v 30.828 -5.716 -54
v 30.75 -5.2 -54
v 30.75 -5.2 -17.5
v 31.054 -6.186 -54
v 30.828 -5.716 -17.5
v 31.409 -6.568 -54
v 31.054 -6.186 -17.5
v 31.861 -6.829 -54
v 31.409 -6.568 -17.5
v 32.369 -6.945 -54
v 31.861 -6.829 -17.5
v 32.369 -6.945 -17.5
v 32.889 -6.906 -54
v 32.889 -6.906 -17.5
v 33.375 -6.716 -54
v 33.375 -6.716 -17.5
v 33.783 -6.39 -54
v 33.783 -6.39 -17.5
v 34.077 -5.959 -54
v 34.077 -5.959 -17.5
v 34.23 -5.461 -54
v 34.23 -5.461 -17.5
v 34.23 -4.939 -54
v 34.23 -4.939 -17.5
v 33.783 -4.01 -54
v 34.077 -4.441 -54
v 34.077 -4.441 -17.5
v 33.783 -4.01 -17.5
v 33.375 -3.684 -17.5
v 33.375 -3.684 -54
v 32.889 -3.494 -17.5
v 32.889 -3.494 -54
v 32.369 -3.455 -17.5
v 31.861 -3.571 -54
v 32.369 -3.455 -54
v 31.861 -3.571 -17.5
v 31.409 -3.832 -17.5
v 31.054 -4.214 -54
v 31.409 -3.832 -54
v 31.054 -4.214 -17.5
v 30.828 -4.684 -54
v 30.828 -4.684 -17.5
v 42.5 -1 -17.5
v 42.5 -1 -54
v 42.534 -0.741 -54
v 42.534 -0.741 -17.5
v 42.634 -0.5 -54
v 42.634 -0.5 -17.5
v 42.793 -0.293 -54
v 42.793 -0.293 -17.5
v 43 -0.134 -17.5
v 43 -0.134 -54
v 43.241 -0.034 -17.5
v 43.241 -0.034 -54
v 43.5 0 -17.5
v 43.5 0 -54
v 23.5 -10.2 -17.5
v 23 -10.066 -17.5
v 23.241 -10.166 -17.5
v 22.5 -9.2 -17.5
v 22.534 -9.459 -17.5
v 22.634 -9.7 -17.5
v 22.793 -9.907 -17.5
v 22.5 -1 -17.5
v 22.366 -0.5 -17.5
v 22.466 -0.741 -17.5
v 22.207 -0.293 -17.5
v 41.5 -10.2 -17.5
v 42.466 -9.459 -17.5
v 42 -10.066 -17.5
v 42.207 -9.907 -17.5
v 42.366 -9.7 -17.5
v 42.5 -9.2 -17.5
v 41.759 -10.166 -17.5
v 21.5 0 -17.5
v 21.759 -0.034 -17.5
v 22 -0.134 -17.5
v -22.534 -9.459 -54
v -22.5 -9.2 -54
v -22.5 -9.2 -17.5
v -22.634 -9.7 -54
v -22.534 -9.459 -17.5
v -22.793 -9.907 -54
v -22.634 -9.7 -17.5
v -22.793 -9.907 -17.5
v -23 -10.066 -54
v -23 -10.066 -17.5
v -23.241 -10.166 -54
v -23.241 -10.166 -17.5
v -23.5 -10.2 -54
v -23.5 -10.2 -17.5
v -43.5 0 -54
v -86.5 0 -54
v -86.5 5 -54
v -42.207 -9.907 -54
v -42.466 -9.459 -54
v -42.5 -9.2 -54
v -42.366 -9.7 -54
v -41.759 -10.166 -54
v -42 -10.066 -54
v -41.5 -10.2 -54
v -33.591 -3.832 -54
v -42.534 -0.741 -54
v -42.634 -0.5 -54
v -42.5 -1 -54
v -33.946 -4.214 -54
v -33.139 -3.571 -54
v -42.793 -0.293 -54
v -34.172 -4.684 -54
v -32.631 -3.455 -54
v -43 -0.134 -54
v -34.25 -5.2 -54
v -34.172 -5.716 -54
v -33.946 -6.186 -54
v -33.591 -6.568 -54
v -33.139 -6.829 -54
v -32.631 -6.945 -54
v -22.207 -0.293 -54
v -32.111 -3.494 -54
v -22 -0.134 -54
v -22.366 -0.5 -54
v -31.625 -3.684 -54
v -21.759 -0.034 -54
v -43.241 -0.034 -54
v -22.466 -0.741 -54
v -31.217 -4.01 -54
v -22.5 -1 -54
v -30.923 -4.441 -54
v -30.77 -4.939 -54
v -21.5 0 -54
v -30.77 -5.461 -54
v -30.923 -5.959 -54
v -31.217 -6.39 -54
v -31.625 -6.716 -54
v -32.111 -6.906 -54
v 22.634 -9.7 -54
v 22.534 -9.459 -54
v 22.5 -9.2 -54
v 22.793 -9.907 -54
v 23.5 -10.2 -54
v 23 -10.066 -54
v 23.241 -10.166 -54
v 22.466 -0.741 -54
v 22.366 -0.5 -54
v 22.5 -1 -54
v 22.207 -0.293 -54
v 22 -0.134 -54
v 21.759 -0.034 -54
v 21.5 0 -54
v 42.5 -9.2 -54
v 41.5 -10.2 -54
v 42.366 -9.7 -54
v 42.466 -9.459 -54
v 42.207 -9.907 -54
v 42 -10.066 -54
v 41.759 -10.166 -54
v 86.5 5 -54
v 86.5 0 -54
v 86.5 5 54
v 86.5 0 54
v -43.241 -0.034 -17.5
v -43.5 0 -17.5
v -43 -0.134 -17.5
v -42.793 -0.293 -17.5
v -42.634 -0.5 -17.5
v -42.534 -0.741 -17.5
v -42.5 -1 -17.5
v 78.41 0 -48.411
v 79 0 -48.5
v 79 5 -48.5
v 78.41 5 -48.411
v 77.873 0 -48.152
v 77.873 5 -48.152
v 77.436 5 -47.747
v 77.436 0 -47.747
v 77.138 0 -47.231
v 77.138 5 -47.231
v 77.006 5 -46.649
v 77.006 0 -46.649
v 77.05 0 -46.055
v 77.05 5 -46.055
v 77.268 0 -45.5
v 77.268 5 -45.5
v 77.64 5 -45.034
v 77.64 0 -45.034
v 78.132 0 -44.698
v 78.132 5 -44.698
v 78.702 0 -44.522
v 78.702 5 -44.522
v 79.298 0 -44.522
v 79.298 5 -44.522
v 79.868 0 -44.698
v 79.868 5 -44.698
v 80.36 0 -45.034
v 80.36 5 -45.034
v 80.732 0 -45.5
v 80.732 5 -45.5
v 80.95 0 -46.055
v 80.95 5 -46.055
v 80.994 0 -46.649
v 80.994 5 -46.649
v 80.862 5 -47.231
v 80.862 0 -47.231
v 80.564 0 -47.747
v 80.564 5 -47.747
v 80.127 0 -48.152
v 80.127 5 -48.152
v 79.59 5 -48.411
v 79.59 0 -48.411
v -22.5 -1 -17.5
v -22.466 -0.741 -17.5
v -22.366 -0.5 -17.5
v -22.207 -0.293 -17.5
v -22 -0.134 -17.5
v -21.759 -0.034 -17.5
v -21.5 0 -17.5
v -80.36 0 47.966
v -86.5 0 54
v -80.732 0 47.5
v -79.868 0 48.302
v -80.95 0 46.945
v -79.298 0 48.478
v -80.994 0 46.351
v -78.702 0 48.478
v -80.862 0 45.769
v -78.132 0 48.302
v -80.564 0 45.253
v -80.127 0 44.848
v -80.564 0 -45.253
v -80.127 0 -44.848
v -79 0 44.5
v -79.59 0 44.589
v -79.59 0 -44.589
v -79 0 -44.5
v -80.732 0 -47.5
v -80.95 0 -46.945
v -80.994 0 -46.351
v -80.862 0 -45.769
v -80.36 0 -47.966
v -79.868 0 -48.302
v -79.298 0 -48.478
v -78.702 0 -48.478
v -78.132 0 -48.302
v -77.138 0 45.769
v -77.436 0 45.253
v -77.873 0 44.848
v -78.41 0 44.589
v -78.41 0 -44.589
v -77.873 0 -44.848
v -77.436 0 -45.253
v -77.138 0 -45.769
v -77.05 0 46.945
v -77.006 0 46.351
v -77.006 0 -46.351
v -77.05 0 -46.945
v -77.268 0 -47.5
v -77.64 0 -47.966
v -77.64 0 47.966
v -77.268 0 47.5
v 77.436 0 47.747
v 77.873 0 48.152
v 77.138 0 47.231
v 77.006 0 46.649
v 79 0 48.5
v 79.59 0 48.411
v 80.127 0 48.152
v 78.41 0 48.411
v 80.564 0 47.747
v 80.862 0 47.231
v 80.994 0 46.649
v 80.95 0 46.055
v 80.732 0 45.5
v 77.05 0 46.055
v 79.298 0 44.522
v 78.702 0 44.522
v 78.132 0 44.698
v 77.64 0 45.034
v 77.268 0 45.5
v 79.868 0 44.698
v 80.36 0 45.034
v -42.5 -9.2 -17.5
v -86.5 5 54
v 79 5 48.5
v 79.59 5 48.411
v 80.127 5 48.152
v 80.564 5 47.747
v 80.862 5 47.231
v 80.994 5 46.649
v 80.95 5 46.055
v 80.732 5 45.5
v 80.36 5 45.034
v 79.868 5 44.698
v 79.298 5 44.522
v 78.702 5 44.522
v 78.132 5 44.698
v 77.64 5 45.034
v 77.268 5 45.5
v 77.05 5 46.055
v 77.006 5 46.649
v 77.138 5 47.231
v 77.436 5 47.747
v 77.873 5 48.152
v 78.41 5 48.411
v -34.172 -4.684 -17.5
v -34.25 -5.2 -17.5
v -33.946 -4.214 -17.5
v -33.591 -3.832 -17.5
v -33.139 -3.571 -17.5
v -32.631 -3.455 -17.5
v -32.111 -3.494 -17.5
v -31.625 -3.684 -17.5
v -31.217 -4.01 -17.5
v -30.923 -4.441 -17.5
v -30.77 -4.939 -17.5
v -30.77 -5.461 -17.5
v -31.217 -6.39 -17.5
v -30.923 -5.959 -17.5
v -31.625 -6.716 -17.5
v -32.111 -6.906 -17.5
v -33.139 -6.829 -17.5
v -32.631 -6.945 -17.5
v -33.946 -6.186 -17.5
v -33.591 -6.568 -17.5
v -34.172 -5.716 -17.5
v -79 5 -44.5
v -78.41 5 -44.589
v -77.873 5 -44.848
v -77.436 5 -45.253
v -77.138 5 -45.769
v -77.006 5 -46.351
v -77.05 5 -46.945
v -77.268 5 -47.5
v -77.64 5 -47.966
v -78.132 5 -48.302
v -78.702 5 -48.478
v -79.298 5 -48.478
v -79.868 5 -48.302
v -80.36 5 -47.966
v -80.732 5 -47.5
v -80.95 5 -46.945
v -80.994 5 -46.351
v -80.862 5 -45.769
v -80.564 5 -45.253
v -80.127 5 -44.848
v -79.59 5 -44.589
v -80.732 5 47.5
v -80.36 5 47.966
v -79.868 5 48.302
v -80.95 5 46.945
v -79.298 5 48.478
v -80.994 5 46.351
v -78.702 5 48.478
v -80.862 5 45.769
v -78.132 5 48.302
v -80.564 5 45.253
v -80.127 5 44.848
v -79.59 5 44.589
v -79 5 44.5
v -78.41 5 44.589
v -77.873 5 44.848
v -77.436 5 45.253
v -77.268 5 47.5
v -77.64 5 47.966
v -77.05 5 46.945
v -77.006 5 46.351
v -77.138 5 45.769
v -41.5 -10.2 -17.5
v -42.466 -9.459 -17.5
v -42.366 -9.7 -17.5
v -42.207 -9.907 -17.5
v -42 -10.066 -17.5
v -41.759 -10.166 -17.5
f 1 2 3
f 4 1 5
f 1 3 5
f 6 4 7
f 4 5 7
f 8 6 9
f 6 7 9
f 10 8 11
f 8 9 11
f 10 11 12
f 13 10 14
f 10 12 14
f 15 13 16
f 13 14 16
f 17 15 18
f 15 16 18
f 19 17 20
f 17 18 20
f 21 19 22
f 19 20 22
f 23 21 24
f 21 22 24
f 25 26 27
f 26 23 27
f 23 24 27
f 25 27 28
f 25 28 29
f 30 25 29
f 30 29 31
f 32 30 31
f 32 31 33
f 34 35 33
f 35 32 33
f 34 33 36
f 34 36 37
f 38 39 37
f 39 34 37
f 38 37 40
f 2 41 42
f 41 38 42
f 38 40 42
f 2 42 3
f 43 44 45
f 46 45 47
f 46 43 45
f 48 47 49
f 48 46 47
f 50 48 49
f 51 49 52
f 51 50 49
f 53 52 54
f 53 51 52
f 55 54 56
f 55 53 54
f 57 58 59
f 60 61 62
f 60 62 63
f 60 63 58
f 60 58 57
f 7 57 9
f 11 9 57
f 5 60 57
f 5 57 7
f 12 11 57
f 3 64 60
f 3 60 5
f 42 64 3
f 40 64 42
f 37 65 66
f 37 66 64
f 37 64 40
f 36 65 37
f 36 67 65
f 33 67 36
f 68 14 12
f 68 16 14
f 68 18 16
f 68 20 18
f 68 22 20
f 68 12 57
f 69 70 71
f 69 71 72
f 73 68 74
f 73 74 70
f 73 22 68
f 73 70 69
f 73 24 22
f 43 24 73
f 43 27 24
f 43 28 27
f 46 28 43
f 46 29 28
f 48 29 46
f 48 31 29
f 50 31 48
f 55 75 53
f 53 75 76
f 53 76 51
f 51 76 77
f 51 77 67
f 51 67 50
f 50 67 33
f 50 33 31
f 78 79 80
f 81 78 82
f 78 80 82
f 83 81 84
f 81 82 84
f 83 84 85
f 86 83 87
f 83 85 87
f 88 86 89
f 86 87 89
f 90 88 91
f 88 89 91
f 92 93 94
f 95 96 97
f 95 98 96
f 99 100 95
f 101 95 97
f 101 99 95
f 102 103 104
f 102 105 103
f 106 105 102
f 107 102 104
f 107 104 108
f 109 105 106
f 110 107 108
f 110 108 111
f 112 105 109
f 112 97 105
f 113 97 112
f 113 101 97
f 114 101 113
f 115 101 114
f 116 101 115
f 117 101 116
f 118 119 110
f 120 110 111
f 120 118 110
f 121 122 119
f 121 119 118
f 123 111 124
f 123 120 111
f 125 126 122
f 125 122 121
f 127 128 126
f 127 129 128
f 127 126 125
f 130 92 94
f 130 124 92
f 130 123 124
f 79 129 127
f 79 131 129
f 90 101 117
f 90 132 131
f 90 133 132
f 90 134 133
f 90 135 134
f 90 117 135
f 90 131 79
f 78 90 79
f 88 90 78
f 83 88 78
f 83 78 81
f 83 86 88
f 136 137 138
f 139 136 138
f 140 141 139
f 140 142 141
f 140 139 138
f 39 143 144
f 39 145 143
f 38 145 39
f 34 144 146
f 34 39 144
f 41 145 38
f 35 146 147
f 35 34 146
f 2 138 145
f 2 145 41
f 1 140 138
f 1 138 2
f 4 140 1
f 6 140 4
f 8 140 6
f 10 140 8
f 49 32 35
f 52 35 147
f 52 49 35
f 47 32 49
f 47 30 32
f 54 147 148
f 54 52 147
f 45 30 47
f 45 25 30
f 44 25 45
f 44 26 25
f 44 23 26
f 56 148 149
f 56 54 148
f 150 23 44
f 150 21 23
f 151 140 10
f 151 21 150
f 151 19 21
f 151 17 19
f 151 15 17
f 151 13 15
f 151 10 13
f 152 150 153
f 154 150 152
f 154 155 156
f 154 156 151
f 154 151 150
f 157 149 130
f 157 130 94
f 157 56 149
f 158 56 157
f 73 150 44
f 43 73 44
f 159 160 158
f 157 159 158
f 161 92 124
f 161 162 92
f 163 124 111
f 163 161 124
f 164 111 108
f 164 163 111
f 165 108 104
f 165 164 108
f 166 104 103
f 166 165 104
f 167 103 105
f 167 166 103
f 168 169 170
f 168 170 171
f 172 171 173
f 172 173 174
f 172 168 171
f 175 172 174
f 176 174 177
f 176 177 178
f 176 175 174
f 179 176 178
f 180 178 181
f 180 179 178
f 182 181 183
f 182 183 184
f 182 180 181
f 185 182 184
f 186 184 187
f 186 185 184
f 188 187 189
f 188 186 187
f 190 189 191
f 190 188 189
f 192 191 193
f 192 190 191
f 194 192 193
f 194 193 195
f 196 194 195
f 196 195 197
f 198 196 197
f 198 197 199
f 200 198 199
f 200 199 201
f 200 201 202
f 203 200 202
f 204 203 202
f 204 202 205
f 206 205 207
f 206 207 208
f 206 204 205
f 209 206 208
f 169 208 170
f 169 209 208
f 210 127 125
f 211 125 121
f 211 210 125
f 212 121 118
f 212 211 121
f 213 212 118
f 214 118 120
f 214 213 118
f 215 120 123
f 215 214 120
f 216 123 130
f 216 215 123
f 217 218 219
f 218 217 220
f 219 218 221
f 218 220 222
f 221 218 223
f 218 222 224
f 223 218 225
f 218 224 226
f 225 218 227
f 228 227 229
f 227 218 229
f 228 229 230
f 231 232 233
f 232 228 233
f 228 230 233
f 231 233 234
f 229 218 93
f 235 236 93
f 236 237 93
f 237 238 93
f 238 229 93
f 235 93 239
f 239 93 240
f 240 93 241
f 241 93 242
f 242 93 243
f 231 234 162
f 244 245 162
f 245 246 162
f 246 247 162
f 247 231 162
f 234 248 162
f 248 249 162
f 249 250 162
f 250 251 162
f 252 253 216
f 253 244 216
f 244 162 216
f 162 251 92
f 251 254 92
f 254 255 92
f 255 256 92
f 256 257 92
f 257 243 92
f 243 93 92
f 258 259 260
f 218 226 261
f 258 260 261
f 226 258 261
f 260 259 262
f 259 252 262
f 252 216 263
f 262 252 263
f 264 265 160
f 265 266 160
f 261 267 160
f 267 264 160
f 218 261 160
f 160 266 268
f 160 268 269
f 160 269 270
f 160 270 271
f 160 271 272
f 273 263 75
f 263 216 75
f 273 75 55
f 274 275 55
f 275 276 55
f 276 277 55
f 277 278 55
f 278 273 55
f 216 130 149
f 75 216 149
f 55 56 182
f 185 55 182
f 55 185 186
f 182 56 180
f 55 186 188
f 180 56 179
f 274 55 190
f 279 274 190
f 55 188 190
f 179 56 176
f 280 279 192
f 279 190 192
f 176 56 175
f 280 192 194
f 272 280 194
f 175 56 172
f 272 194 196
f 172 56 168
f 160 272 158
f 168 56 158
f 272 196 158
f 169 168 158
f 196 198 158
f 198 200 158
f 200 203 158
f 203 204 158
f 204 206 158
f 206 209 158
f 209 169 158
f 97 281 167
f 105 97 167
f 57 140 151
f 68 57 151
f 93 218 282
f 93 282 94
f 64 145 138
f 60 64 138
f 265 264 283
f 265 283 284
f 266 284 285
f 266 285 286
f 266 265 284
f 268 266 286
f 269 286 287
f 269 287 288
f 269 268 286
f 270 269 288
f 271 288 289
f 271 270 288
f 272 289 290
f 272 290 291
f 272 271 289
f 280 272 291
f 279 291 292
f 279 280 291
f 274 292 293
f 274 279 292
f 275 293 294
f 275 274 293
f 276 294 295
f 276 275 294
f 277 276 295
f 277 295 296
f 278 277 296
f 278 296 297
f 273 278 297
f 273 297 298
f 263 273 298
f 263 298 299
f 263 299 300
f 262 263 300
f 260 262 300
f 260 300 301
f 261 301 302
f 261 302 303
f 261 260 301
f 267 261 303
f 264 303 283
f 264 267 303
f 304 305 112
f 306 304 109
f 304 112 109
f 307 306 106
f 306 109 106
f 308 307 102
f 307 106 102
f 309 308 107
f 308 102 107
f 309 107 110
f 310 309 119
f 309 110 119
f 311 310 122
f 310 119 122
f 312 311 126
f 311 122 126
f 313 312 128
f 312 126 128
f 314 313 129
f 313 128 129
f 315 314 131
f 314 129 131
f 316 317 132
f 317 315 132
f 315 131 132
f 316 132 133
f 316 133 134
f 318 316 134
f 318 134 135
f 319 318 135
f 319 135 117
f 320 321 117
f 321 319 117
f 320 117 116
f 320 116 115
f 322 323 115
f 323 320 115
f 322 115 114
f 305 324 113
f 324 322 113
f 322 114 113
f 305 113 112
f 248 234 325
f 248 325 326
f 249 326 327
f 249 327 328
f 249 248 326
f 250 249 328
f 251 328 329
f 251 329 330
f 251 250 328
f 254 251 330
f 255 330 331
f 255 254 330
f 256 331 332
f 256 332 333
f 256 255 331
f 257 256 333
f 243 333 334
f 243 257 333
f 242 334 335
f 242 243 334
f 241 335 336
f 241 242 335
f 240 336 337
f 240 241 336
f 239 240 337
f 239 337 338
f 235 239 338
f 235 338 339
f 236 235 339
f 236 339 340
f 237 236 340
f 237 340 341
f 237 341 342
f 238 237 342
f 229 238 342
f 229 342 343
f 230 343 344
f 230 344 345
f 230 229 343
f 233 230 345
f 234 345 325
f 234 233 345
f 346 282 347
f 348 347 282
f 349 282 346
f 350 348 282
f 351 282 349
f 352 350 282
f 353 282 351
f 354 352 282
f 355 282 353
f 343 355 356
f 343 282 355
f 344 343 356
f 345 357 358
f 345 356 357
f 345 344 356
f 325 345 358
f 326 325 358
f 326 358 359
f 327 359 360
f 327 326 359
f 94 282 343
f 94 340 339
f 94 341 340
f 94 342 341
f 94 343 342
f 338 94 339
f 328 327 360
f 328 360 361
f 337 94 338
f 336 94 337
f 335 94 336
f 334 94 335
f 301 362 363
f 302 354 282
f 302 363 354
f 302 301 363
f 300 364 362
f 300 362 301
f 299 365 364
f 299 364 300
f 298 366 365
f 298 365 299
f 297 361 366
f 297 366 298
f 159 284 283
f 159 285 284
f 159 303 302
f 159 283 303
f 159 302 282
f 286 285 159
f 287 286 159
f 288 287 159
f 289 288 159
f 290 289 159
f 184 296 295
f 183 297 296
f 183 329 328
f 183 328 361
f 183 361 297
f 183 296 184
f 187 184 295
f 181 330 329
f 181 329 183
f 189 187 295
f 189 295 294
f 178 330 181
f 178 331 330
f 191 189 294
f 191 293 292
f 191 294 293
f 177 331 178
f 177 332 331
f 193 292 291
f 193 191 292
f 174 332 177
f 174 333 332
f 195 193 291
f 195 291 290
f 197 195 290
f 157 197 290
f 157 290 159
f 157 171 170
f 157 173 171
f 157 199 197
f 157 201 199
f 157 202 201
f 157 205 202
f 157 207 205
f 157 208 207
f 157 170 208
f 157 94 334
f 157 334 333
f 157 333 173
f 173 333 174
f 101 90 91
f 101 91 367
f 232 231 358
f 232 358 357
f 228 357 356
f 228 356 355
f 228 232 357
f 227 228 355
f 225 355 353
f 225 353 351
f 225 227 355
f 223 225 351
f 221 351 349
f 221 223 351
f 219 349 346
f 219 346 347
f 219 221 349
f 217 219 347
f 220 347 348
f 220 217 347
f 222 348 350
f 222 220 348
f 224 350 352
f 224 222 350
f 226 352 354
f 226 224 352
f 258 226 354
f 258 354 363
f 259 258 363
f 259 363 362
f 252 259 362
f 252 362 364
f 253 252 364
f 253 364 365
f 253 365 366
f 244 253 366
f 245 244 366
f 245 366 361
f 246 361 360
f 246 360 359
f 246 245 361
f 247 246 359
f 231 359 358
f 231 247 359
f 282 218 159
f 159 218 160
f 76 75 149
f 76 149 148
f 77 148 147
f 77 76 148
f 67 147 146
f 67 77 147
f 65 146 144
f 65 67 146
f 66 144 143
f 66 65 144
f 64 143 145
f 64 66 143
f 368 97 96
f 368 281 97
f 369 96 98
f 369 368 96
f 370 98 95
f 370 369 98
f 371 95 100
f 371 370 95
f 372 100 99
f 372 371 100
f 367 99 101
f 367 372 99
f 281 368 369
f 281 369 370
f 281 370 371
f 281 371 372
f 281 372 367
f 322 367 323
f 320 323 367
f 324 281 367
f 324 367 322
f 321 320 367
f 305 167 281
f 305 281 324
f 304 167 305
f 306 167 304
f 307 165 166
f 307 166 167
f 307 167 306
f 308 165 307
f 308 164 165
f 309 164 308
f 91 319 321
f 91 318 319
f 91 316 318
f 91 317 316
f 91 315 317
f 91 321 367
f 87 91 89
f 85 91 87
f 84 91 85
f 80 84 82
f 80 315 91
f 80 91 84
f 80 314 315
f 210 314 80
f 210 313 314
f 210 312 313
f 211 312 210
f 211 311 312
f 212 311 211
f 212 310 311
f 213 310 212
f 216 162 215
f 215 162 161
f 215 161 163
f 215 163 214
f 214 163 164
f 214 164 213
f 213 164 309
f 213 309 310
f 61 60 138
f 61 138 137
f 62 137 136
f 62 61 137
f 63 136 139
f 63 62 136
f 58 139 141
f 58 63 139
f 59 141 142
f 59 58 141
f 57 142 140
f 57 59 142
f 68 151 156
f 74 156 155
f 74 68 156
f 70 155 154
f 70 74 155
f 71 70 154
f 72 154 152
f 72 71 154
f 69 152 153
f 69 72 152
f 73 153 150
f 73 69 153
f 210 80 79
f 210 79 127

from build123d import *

# Parameters (mm, degrees)
SKETCH_1_W      = 173
SKETCH_1_H      = 108
SKETCH_1_R      = 2
EXTRUDE_1_DEPTH = 5
SKETCH_2_W      = 20
SKETCH_2_H      = 10.2
SKETCH_2_R      = 1.75
EXTRUDE_2_DEPTH = 30
FILLET_1_R      = 1
EXTRUDE_START   = 6.5
SKETCH_3_R      = 1.75
EXTRUDE_3_DEPTH = 6.5


with BuildPart() as part:
    # 草图1 → 凸台-拉伸1 (new body)
    with BuildSketch(Plane(origin=(0, 0, 0), x_dir=(1, 0, 0), z_dir=(0, 1, 0))):
        Rectangle(SKETCH_1_W, SKETCH_1_H)
        with Locations(Location((-79, 46.5, 0), (0, 0, 270))):
            Circle(SKETCH_1_R, mode=Mode.SUBTRACT)
        with Locations(Location((79, 46.5, 0), (0, 0, 90))):
            Circle(SKETCH_1_R, mode=Mode.SUBTRACT)
        with Locations(Location((79, -46.5, 0), (0, 0, 270))):
            Circle(SKETCH_1_R, mode=Mode.SUBTRACT)
        with Locations(Location((-79, -46.5, 0), (0, 0, 90))):
            Circle(SKETCH_1_R, mode=Mode.SUBTRACT)
    extrude(amount=EXTRUDE_1_DEPTH)

    # 草图2 → 凸台-拉伸2 (add)
    # profile 1 of 2: a face of its own
    with BuildSketch(Plane(origin=(0, 0, -54), x_dir=(-1, 0, 0), z_dir=(0, 0, -1))):
        with Locations((-32.5, -5.1)):
            Rectangle(SKETCH_2_W, SKETCH_2_H)
        with Locations((-32.5, -5.2)):
            Circle(SKETCH_2_R, mode=Mode.SUBTRACT)
    # profile 2 of 2: a face of its own
    with BuildSketch(Plane(origin=(0, 0, -54), x_dir=(-1, 0, 0), z_dir=(0, 0, -1))):
        with Locations((32.5, -5.1)):
            Rectangle(SKETCH_2_W, SKETCH_2_H)
        with Locations((32.5, -5.2)):
            Circle(SKETCH_2_R, mode=Mode.SUBTRACT)
    extrude(amount=-EXTRUDE_2_DEPTH)

    # 圆角1
    fillet_1_edges = [part.edges().sort_by_distance(p)[0] for p in [
        (42.5, -10.2, -39),
        (42.5, 0, -39),
        (22.5, 0, -39),
        (22.5, -10.2, -39),
        (-22.5, -10.2, -39),
        (-22.5, 0, -39),
        (-42.5, 0, -39),
        (-42.5, -10.2, -39),
    ]]
    fillet(fillet_1_edges, radius=FILLET_1_R)

    # 草图3 → 凸台-拉伸3 (add)
    # profile 1 of 2: a face of its own
    with BuildSketch(Plane.XY.offset(-24).offset(EXTRUDE_START)):
        with BuildLine():
            Line((23.5, -10.2), (41.5, -10.2))
            ThreePointArc((41.5, -10.2), (42.207106781, -9.907106781), (42.5, -9.2))
            Line((42.5, -9.2), (42.5, -1))
            ThreePointArc((42.5, -1), (42.792893219, -0.292893219), (43.5, 0))
            Line((43.5, 0), (21.5, 0))
            ThreePointArc((21.5, 0), (22.207106781, -0.292893219), (22.5, -1))
            Line((22.5, -1), (22.5, -9.2))
            ThreePointArc((22.5, -9.2), (22.792893219, -9.907106781), (23.5, -10.2))
        make_face()
        with Locations(Location((32.5, -5.2, 0), (0, 0, 180))):
            Circle(SKETCH_3_R, mode=Mode.SUBTRACT)
    # profile 2 of 2: a face of its own
    with BuildSketch(Plane.XY.offset(-24).offset(EXTRUDE_START)):
        with BuildLine():
            Line((-41.5, -10.2), (-23.5, -10.2))
            ThreePointArc((-23.5, -10.2), (-22.792893219, -9.907106781), (-22.5, -9.2))
            Line((-22.5, -9.2), (-22.5, -1))
            ThreePointArc((-22.5, -1), (-22.207106781, -0.292893219), (-21.5, 0))
            Line((-21.5, 0), (-43.5, 0))
            ThreePointArc((-43.5, 0), (-42.792893219, -0.292893219), (-42.5, -1))
            Line((-42.5, -1), (-42.5, -9.2))
            ThreePointArc((-42.5, -9.2), (-42.207106781, -9.907106781), (-41.5, -10.2))
        make_face()
        with Locations(Location((-32.5, -5.2, 0), (0, 0, 180))):
            Circle(SKETCH_3_R, mode=Mode.SUBTRACT)
    extrude(amount=-EXTRUDE_3_DEPTH)


solid = part.part
